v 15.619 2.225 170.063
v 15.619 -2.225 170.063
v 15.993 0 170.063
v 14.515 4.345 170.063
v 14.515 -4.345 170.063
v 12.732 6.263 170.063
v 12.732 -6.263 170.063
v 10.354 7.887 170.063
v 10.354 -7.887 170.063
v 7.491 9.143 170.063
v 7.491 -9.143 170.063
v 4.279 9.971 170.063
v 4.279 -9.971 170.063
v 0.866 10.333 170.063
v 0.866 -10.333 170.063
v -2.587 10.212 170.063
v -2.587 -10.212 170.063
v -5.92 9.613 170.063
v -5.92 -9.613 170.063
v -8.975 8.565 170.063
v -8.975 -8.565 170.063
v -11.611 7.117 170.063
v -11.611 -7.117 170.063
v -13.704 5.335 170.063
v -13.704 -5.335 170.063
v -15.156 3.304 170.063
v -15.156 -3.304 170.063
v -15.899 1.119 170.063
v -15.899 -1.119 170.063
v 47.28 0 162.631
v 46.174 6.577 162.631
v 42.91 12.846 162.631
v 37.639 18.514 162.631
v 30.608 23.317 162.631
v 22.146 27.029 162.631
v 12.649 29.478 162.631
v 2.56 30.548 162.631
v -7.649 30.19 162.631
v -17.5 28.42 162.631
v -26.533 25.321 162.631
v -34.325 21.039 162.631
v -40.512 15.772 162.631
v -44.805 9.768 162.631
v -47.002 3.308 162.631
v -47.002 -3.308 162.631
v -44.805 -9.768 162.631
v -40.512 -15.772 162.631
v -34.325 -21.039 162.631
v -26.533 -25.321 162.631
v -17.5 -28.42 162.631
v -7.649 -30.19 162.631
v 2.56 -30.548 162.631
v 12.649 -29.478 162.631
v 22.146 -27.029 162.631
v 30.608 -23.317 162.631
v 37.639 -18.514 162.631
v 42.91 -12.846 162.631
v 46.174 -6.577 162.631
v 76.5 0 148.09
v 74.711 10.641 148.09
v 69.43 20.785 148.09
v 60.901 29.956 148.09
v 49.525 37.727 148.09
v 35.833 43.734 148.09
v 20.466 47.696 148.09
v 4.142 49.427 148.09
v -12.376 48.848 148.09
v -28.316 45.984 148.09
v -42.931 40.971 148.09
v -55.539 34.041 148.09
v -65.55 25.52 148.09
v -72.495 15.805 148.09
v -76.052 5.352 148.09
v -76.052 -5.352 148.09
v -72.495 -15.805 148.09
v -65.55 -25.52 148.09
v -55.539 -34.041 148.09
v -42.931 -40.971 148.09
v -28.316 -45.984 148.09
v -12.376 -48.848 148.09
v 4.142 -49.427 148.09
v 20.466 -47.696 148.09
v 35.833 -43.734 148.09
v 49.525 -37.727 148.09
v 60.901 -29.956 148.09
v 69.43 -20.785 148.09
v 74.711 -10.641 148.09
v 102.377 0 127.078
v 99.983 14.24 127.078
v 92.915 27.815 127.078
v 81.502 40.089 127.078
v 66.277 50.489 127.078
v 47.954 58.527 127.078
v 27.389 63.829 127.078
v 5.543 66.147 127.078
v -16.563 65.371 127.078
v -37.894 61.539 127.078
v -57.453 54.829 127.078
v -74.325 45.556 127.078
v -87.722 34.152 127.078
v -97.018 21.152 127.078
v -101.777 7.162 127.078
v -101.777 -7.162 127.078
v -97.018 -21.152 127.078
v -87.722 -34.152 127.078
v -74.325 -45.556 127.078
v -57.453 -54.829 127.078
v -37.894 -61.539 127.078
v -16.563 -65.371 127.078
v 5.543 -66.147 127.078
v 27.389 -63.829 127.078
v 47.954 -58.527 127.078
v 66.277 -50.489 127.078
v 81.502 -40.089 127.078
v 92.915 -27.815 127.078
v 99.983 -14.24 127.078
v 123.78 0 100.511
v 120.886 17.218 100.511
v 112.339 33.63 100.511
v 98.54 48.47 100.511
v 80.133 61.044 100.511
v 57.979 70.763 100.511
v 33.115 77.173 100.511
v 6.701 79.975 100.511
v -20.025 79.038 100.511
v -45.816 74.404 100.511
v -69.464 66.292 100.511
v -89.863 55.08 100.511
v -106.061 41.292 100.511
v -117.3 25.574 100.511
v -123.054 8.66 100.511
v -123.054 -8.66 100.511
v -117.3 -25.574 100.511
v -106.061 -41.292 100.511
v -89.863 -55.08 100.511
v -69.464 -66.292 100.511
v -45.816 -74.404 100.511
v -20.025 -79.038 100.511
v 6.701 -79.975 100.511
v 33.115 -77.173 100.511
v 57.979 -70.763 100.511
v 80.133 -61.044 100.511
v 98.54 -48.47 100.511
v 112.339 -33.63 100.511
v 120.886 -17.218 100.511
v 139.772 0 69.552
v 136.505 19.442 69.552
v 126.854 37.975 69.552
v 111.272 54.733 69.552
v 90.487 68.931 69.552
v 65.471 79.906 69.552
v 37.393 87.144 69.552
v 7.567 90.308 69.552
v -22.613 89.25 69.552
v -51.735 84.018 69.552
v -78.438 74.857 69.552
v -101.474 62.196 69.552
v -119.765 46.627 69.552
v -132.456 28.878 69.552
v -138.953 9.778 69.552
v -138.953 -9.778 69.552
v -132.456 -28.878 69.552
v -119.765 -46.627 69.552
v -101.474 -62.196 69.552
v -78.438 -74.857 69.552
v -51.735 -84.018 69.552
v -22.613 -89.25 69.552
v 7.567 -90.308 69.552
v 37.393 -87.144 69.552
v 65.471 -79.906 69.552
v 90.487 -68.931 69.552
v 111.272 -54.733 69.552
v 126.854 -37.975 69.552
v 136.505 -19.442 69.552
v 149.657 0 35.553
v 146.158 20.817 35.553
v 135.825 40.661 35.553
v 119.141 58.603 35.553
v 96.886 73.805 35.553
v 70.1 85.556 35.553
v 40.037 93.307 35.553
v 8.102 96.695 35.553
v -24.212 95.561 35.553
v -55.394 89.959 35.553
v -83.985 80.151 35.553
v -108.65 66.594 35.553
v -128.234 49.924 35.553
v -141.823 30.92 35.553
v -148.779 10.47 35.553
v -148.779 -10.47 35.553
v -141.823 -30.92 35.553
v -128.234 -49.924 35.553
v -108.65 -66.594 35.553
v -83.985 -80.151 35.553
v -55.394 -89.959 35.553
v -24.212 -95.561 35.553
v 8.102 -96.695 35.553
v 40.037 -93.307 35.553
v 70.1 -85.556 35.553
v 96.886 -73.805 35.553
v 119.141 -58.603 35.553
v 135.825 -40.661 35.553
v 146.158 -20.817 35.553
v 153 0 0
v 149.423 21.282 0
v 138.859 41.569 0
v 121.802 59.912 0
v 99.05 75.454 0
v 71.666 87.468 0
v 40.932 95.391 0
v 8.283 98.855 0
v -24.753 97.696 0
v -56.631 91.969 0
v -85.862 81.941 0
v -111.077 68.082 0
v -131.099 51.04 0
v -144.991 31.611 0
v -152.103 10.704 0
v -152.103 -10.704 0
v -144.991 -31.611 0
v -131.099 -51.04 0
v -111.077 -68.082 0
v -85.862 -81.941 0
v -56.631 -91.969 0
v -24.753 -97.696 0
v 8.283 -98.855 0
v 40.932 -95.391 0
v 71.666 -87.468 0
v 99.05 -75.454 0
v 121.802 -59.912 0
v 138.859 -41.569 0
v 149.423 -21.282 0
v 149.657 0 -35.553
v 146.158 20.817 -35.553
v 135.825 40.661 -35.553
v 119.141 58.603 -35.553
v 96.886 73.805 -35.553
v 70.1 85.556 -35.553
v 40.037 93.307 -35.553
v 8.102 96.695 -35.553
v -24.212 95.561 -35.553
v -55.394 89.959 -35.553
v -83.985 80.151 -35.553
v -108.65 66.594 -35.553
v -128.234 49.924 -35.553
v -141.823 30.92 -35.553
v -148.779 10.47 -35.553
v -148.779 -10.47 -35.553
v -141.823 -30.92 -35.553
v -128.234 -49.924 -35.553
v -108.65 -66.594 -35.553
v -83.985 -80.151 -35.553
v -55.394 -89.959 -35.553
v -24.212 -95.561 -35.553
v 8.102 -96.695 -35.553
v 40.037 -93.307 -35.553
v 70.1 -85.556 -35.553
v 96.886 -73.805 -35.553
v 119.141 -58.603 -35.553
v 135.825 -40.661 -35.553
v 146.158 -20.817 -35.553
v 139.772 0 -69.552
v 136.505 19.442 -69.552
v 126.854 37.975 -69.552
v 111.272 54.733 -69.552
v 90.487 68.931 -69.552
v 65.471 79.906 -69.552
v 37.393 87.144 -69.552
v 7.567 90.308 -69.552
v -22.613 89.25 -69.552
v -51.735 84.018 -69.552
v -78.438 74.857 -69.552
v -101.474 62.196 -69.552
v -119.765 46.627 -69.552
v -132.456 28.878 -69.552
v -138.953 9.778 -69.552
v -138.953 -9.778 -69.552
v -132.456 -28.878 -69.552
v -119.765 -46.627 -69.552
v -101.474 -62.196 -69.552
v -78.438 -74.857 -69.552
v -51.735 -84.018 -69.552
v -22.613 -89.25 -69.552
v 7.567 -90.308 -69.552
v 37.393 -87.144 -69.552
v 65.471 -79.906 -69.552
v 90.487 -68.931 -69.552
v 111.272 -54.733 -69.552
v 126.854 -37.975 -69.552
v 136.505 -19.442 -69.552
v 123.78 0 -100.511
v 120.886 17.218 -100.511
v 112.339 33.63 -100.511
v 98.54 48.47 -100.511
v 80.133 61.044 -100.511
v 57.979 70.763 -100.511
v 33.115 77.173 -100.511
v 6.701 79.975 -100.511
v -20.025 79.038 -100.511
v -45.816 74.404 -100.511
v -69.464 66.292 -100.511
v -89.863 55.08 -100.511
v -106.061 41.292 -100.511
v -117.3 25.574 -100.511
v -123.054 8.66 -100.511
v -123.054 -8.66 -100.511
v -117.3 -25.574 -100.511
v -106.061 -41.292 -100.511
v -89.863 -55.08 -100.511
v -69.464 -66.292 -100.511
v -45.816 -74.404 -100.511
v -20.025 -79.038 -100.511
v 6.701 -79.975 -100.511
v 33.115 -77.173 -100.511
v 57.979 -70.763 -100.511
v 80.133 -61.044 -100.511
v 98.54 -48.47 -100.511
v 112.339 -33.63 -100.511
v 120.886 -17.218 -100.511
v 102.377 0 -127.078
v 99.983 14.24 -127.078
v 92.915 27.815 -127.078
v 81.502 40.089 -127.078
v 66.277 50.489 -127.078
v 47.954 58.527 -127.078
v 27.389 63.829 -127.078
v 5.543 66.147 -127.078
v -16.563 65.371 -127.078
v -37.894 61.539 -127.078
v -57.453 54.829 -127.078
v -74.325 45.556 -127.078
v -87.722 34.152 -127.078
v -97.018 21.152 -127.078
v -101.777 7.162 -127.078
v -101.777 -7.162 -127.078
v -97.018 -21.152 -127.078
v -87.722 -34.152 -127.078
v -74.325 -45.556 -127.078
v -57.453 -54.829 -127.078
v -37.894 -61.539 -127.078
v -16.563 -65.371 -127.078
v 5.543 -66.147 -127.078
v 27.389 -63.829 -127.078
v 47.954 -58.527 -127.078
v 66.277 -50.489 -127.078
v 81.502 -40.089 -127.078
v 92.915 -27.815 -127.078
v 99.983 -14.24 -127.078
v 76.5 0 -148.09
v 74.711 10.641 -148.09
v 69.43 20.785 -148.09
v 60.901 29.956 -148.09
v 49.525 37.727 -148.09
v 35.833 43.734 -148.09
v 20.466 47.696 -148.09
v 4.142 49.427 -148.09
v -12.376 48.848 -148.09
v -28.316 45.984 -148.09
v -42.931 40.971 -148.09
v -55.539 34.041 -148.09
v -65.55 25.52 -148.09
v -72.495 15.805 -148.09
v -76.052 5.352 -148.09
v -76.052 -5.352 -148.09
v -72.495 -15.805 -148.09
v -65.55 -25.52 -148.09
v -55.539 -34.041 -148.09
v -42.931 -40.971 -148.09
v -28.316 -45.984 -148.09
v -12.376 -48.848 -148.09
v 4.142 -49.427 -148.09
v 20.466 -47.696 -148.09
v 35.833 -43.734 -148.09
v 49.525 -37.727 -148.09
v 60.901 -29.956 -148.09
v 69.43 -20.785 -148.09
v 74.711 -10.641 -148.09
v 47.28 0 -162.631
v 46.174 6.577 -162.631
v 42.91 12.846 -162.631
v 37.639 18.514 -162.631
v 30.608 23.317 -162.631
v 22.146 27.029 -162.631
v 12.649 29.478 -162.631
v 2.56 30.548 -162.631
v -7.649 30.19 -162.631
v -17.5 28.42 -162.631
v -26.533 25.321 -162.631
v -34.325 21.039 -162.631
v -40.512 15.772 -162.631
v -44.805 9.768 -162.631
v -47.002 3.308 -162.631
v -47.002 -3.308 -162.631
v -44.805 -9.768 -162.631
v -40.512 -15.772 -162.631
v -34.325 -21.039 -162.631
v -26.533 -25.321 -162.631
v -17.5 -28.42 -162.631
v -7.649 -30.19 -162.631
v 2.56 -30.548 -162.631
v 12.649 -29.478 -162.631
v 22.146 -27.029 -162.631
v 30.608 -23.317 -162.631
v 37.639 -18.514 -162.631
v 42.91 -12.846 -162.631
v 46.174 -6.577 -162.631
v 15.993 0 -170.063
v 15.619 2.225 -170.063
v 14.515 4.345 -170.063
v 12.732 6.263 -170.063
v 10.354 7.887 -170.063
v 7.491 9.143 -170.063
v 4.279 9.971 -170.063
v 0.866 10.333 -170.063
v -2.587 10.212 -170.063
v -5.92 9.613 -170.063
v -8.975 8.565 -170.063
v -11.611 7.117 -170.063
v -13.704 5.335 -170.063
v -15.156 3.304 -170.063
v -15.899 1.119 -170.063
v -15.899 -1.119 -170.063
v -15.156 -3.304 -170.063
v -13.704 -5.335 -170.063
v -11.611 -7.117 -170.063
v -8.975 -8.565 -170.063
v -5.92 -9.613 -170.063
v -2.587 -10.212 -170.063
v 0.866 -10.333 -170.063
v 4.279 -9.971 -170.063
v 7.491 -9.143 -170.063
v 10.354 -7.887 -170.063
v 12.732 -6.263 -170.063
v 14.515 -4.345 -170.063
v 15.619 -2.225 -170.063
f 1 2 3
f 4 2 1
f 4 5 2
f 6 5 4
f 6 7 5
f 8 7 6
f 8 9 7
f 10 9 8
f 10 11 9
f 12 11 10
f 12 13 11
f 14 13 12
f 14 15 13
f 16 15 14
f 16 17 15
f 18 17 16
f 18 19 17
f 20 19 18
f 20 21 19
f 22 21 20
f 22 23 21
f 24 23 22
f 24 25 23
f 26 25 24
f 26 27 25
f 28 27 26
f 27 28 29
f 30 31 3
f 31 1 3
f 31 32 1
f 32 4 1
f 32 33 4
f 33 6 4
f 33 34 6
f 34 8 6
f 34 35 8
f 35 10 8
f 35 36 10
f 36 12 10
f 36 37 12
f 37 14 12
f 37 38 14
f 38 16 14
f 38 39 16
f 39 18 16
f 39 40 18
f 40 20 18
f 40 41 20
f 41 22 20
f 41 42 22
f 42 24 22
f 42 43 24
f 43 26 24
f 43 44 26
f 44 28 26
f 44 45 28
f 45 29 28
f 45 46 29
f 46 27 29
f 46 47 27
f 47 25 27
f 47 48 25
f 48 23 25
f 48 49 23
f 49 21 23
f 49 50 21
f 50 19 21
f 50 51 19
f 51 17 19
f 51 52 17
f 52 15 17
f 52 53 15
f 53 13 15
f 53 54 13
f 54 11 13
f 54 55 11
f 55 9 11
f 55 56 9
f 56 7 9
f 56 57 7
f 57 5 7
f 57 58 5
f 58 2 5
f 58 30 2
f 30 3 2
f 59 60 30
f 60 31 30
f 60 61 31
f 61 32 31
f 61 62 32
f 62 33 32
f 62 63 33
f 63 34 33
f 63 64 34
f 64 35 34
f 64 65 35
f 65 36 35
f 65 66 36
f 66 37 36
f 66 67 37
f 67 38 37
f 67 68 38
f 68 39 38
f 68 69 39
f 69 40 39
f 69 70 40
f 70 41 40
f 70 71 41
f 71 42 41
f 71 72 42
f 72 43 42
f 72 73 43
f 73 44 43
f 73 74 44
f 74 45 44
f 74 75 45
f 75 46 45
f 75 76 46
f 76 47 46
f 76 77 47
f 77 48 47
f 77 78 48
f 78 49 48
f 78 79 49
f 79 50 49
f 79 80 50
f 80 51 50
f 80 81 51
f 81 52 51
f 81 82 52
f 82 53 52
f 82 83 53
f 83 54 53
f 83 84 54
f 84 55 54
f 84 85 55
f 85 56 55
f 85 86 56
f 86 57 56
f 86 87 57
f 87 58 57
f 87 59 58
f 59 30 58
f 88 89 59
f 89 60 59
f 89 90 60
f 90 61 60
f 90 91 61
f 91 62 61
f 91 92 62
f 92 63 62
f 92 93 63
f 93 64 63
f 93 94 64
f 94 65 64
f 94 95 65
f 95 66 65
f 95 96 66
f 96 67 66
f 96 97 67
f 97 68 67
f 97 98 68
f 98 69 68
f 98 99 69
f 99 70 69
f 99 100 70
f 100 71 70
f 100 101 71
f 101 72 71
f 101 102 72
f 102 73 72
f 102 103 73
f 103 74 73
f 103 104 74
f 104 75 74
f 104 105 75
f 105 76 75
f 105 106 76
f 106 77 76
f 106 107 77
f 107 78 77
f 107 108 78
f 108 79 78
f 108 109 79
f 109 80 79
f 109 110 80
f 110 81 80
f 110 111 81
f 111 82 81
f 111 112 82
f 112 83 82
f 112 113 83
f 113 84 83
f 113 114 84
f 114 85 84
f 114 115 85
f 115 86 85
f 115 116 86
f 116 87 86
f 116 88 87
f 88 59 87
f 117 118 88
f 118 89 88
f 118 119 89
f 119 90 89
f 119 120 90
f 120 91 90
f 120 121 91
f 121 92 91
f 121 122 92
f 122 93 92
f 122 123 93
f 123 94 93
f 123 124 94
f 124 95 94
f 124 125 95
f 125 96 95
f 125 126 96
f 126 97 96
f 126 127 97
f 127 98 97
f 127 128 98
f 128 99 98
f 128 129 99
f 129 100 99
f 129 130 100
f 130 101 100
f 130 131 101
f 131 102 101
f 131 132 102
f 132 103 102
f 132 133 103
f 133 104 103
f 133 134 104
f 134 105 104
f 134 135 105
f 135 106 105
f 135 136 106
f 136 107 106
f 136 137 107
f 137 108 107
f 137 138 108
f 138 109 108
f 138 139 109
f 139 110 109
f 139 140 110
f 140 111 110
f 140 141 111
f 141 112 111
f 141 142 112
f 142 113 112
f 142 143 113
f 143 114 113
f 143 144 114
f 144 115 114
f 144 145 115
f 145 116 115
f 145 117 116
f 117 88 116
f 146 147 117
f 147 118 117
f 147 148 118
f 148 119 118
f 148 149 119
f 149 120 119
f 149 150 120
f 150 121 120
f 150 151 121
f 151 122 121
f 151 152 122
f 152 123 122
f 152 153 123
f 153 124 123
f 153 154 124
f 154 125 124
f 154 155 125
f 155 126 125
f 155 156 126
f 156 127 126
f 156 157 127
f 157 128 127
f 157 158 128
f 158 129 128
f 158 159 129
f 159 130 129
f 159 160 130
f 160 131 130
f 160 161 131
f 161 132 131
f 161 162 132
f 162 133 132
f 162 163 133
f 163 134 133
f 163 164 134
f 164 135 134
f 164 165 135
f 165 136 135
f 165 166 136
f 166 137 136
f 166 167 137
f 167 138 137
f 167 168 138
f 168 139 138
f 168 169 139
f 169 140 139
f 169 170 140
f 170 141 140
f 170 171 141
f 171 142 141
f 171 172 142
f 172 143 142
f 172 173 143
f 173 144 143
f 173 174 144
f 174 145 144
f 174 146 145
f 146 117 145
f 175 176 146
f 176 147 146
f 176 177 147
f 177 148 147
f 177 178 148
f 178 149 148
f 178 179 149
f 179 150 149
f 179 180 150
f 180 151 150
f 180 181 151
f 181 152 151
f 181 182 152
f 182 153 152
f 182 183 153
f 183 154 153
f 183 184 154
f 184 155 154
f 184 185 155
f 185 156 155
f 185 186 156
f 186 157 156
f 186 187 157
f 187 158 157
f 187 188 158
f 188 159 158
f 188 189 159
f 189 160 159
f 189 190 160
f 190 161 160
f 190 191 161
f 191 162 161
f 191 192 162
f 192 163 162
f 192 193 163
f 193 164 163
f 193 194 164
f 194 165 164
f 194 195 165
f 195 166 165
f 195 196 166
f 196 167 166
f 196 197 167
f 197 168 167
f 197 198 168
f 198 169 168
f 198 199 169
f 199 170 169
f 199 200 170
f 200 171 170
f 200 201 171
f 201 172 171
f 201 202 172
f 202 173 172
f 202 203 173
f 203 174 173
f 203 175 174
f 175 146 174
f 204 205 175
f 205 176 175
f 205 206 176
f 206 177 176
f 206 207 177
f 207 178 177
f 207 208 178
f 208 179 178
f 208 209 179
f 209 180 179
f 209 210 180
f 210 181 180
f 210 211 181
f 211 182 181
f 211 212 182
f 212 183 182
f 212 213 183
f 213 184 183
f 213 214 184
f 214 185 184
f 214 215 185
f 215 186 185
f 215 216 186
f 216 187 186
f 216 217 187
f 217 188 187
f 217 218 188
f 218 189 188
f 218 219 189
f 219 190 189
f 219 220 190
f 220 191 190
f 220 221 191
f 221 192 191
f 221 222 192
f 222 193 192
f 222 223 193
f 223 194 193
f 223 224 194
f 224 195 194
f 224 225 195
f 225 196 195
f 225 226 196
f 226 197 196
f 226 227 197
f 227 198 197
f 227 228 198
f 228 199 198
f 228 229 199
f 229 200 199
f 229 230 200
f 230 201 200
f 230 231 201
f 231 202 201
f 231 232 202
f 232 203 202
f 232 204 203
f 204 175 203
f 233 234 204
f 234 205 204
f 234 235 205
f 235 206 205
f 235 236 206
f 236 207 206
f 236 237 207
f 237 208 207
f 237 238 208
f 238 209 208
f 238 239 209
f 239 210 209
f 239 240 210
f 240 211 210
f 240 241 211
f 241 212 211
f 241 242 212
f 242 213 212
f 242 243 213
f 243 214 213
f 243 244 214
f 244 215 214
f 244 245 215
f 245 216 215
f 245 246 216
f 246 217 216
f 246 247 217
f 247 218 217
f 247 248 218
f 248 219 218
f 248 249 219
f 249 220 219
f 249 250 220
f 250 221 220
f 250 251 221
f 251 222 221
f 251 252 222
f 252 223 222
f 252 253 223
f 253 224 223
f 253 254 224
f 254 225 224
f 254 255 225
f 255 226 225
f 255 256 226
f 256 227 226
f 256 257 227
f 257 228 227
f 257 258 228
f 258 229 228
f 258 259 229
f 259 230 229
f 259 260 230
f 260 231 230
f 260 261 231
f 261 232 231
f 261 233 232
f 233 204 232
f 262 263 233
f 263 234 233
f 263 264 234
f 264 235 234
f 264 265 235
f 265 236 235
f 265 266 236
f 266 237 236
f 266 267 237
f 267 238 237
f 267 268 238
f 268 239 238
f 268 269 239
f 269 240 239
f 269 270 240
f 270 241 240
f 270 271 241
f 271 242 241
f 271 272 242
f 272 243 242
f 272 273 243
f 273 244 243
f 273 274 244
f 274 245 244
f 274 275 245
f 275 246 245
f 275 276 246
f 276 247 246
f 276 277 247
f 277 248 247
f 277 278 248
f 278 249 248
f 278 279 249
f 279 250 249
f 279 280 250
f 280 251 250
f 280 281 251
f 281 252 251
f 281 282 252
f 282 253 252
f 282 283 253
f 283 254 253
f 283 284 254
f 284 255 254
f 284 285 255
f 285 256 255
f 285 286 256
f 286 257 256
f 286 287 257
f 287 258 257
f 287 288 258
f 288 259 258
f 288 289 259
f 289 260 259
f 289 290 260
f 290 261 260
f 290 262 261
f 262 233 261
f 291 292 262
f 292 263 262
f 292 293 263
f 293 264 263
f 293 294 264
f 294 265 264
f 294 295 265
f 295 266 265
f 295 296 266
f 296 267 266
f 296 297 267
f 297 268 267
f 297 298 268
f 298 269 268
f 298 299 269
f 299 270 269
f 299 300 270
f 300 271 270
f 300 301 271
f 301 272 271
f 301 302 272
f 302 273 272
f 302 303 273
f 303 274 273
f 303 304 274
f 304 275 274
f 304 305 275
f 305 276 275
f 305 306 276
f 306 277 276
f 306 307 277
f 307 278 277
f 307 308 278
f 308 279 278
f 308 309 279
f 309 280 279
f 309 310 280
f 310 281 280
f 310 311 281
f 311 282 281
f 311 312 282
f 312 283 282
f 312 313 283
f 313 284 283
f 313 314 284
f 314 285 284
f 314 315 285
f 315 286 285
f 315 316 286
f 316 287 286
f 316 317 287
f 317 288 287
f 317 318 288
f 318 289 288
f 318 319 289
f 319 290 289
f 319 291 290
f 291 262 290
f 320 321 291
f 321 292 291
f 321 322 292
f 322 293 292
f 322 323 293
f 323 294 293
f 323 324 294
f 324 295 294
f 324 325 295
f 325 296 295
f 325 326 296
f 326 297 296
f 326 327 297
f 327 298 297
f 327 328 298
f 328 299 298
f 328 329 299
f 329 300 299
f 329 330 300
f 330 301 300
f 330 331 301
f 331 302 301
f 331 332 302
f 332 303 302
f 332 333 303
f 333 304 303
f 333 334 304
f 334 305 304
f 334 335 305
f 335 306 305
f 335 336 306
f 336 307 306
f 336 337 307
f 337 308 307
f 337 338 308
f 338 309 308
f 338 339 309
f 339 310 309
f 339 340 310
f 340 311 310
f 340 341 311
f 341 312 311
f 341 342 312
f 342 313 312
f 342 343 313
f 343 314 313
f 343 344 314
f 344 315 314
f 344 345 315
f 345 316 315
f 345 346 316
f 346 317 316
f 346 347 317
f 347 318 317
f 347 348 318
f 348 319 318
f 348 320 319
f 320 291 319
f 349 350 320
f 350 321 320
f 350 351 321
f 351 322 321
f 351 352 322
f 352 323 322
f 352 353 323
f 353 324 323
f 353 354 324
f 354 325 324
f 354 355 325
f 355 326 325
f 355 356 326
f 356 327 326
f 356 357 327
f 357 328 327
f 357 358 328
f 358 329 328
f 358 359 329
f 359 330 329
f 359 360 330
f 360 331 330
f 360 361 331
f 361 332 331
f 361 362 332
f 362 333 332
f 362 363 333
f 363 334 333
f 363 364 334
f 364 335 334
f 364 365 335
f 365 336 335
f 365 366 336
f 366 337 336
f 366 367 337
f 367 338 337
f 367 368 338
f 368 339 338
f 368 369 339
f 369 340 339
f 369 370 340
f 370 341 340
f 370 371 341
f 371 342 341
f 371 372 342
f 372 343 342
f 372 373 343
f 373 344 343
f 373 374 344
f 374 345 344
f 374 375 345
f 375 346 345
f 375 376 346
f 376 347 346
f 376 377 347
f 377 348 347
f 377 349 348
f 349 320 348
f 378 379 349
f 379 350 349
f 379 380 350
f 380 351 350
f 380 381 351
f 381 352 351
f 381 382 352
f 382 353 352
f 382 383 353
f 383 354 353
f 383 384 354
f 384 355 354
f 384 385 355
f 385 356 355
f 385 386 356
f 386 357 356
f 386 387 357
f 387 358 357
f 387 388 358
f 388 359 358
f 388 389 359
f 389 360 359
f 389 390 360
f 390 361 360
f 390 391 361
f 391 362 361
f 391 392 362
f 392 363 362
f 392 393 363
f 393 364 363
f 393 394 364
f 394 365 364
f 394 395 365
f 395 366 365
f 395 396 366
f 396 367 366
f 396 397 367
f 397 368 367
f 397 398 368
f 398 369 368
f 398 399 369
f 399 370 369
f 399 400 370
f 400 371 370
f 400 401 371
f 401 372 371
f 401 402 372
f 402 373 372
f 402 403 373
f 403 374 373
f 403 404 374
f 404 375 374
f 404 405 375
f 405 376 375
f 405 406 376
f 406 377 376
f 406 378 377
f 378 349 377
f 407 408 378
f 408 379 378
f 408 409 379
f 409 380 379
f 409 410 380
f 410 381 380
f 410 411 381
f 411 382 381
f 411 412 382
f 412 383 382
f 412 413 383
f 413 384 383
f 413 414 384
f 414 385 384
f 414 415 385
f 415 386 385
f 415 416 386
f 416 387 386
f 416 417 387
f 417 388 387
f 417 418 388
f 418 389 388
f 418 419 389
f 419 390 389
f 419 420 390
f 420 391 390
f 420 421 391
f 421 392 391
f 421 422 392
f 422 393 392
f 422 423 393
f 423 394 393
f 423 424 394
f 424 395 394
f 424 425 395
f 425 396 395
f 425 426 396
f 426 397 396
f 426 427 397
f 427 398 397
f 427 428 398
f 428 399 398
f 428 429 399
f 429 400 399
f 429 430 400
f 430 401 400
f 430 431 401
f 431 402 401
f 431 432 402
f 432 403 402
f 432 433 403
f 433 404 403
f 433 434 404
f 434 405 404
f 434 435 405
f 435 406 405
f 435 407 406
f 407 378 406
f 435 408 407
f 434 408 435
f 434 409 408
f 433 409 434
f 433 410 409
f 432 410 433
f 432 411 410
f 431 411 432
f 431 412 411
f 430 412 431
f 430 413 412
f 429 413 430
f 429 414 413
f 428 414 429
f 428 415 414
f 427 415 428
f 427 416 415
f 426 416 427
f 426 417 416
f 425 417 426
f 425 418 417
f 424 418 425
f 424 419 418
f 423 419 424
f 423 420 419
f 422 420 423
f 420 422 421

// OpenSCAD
// Generated by SolidPython 1.0.1 on 2020-07-29 00:46:53


scale(v = [17, 11, 19]) {
	sphere(r = 9);
}
/***********************************************
*********      SolidPython code:      **********
************************************************
 
# import packages: SolidPython
from solid import *
from solid.utils import *
from itertools import chain, combinations, permutations


class Resize:

    def __init__(self, scad_file):
        self.scad_file = scad_file
        #self.scad_file = import_scad(scad_file)
        # cone/cylinder param:
        self.r1 = 0
        self.r2 = 0
        self.h = 0
        # rectangular prism param:
        self.w = 0
        self.l = 0
        # ellipse param:
        self.r = 0

    # import OpenScad code (file name corresponds to shape)


    # classify shape + parameters
    def assign(self, param1, param2, param3):
        if self.scad_file == 'cone.scad':
            self.r1 = param1
            self.r2 = param2
            self.h = param3
        elif self.scad_file == 'cylinder.scad':
            self.r1 = param1
            self.r2 = param2
            self.h = param3
        elif self.scad_file == 'rectangularPrism.scad':
            self.h = param1
            self.l = param2
            self.w = param3
        else:
            self.r = param1
            self.h = param2

    # resize parameters
    def iterate(self):
        x = range(3, 20, 2)
        i = 1
        if self.scad_file == 'cone.scad':
            tempList = list(permutations(x, 2))
            for temp in tempList:
                param1 = temp[0]
                param2 = temp[1]
                filepath = 'produced_scad_files/' + 'cone' + str(param1) + '_' + str(param2) + '_' + '.scad'
                scad_render_to_file(cylinder(h=param1, r1=param2, r2=0), filepath)

        elif self.scad_file == 'cylinder.scad':
            tempList = list(permutations(x, 3))
            for temp in tempList:
                param1 = temp[0]
                param2 = temp[1]
                filepath = 'produced_scad_files/' + 'cylinder' + str(param1) + '_' + str(param2) + '_' + '.scad'
                scad_render_to_file(cylinder(h=param1, r1=param2, r2=param2), filepath)

        elif self.scad_file == 'rectangularPrism.scad':
            tempList = list(permutations(x, 3))
            for temp in tempList:
                param1 = temp[0]
                param2 = temp[1]
                param3 = temp[2]
                filepath = 'produced_scad_files/' + 'rectangularPrism' + str(param1) + '_' + str(param2) + '_' + str(
                    param3) + '.scad'
                scad_render_to_file(cube(size=(param1, param2, param3)), filepath)

        elif self.scad_file == 'ellipse.scad':
            tempList = list(permutations(x, 4))
            for temp in tempList:
                param1 = temp[0]
                param2 = temp[1]
                param3 = temp[2]
                param4 = temp[3]
                filepath = 'produced_scad_files/' + 'ellipse' + str(param1) + '_' + str(param2) + '_' + str(param3) + '_' + str(param4) + '.scad'
                scad_render_to_file(scale([param1, param2, param3])(sphere(r=param4)), filepath)

    def render_to_scadfile(self):
        scad_render_to_file(scad, 'example.scad') 
 
************************************************/
